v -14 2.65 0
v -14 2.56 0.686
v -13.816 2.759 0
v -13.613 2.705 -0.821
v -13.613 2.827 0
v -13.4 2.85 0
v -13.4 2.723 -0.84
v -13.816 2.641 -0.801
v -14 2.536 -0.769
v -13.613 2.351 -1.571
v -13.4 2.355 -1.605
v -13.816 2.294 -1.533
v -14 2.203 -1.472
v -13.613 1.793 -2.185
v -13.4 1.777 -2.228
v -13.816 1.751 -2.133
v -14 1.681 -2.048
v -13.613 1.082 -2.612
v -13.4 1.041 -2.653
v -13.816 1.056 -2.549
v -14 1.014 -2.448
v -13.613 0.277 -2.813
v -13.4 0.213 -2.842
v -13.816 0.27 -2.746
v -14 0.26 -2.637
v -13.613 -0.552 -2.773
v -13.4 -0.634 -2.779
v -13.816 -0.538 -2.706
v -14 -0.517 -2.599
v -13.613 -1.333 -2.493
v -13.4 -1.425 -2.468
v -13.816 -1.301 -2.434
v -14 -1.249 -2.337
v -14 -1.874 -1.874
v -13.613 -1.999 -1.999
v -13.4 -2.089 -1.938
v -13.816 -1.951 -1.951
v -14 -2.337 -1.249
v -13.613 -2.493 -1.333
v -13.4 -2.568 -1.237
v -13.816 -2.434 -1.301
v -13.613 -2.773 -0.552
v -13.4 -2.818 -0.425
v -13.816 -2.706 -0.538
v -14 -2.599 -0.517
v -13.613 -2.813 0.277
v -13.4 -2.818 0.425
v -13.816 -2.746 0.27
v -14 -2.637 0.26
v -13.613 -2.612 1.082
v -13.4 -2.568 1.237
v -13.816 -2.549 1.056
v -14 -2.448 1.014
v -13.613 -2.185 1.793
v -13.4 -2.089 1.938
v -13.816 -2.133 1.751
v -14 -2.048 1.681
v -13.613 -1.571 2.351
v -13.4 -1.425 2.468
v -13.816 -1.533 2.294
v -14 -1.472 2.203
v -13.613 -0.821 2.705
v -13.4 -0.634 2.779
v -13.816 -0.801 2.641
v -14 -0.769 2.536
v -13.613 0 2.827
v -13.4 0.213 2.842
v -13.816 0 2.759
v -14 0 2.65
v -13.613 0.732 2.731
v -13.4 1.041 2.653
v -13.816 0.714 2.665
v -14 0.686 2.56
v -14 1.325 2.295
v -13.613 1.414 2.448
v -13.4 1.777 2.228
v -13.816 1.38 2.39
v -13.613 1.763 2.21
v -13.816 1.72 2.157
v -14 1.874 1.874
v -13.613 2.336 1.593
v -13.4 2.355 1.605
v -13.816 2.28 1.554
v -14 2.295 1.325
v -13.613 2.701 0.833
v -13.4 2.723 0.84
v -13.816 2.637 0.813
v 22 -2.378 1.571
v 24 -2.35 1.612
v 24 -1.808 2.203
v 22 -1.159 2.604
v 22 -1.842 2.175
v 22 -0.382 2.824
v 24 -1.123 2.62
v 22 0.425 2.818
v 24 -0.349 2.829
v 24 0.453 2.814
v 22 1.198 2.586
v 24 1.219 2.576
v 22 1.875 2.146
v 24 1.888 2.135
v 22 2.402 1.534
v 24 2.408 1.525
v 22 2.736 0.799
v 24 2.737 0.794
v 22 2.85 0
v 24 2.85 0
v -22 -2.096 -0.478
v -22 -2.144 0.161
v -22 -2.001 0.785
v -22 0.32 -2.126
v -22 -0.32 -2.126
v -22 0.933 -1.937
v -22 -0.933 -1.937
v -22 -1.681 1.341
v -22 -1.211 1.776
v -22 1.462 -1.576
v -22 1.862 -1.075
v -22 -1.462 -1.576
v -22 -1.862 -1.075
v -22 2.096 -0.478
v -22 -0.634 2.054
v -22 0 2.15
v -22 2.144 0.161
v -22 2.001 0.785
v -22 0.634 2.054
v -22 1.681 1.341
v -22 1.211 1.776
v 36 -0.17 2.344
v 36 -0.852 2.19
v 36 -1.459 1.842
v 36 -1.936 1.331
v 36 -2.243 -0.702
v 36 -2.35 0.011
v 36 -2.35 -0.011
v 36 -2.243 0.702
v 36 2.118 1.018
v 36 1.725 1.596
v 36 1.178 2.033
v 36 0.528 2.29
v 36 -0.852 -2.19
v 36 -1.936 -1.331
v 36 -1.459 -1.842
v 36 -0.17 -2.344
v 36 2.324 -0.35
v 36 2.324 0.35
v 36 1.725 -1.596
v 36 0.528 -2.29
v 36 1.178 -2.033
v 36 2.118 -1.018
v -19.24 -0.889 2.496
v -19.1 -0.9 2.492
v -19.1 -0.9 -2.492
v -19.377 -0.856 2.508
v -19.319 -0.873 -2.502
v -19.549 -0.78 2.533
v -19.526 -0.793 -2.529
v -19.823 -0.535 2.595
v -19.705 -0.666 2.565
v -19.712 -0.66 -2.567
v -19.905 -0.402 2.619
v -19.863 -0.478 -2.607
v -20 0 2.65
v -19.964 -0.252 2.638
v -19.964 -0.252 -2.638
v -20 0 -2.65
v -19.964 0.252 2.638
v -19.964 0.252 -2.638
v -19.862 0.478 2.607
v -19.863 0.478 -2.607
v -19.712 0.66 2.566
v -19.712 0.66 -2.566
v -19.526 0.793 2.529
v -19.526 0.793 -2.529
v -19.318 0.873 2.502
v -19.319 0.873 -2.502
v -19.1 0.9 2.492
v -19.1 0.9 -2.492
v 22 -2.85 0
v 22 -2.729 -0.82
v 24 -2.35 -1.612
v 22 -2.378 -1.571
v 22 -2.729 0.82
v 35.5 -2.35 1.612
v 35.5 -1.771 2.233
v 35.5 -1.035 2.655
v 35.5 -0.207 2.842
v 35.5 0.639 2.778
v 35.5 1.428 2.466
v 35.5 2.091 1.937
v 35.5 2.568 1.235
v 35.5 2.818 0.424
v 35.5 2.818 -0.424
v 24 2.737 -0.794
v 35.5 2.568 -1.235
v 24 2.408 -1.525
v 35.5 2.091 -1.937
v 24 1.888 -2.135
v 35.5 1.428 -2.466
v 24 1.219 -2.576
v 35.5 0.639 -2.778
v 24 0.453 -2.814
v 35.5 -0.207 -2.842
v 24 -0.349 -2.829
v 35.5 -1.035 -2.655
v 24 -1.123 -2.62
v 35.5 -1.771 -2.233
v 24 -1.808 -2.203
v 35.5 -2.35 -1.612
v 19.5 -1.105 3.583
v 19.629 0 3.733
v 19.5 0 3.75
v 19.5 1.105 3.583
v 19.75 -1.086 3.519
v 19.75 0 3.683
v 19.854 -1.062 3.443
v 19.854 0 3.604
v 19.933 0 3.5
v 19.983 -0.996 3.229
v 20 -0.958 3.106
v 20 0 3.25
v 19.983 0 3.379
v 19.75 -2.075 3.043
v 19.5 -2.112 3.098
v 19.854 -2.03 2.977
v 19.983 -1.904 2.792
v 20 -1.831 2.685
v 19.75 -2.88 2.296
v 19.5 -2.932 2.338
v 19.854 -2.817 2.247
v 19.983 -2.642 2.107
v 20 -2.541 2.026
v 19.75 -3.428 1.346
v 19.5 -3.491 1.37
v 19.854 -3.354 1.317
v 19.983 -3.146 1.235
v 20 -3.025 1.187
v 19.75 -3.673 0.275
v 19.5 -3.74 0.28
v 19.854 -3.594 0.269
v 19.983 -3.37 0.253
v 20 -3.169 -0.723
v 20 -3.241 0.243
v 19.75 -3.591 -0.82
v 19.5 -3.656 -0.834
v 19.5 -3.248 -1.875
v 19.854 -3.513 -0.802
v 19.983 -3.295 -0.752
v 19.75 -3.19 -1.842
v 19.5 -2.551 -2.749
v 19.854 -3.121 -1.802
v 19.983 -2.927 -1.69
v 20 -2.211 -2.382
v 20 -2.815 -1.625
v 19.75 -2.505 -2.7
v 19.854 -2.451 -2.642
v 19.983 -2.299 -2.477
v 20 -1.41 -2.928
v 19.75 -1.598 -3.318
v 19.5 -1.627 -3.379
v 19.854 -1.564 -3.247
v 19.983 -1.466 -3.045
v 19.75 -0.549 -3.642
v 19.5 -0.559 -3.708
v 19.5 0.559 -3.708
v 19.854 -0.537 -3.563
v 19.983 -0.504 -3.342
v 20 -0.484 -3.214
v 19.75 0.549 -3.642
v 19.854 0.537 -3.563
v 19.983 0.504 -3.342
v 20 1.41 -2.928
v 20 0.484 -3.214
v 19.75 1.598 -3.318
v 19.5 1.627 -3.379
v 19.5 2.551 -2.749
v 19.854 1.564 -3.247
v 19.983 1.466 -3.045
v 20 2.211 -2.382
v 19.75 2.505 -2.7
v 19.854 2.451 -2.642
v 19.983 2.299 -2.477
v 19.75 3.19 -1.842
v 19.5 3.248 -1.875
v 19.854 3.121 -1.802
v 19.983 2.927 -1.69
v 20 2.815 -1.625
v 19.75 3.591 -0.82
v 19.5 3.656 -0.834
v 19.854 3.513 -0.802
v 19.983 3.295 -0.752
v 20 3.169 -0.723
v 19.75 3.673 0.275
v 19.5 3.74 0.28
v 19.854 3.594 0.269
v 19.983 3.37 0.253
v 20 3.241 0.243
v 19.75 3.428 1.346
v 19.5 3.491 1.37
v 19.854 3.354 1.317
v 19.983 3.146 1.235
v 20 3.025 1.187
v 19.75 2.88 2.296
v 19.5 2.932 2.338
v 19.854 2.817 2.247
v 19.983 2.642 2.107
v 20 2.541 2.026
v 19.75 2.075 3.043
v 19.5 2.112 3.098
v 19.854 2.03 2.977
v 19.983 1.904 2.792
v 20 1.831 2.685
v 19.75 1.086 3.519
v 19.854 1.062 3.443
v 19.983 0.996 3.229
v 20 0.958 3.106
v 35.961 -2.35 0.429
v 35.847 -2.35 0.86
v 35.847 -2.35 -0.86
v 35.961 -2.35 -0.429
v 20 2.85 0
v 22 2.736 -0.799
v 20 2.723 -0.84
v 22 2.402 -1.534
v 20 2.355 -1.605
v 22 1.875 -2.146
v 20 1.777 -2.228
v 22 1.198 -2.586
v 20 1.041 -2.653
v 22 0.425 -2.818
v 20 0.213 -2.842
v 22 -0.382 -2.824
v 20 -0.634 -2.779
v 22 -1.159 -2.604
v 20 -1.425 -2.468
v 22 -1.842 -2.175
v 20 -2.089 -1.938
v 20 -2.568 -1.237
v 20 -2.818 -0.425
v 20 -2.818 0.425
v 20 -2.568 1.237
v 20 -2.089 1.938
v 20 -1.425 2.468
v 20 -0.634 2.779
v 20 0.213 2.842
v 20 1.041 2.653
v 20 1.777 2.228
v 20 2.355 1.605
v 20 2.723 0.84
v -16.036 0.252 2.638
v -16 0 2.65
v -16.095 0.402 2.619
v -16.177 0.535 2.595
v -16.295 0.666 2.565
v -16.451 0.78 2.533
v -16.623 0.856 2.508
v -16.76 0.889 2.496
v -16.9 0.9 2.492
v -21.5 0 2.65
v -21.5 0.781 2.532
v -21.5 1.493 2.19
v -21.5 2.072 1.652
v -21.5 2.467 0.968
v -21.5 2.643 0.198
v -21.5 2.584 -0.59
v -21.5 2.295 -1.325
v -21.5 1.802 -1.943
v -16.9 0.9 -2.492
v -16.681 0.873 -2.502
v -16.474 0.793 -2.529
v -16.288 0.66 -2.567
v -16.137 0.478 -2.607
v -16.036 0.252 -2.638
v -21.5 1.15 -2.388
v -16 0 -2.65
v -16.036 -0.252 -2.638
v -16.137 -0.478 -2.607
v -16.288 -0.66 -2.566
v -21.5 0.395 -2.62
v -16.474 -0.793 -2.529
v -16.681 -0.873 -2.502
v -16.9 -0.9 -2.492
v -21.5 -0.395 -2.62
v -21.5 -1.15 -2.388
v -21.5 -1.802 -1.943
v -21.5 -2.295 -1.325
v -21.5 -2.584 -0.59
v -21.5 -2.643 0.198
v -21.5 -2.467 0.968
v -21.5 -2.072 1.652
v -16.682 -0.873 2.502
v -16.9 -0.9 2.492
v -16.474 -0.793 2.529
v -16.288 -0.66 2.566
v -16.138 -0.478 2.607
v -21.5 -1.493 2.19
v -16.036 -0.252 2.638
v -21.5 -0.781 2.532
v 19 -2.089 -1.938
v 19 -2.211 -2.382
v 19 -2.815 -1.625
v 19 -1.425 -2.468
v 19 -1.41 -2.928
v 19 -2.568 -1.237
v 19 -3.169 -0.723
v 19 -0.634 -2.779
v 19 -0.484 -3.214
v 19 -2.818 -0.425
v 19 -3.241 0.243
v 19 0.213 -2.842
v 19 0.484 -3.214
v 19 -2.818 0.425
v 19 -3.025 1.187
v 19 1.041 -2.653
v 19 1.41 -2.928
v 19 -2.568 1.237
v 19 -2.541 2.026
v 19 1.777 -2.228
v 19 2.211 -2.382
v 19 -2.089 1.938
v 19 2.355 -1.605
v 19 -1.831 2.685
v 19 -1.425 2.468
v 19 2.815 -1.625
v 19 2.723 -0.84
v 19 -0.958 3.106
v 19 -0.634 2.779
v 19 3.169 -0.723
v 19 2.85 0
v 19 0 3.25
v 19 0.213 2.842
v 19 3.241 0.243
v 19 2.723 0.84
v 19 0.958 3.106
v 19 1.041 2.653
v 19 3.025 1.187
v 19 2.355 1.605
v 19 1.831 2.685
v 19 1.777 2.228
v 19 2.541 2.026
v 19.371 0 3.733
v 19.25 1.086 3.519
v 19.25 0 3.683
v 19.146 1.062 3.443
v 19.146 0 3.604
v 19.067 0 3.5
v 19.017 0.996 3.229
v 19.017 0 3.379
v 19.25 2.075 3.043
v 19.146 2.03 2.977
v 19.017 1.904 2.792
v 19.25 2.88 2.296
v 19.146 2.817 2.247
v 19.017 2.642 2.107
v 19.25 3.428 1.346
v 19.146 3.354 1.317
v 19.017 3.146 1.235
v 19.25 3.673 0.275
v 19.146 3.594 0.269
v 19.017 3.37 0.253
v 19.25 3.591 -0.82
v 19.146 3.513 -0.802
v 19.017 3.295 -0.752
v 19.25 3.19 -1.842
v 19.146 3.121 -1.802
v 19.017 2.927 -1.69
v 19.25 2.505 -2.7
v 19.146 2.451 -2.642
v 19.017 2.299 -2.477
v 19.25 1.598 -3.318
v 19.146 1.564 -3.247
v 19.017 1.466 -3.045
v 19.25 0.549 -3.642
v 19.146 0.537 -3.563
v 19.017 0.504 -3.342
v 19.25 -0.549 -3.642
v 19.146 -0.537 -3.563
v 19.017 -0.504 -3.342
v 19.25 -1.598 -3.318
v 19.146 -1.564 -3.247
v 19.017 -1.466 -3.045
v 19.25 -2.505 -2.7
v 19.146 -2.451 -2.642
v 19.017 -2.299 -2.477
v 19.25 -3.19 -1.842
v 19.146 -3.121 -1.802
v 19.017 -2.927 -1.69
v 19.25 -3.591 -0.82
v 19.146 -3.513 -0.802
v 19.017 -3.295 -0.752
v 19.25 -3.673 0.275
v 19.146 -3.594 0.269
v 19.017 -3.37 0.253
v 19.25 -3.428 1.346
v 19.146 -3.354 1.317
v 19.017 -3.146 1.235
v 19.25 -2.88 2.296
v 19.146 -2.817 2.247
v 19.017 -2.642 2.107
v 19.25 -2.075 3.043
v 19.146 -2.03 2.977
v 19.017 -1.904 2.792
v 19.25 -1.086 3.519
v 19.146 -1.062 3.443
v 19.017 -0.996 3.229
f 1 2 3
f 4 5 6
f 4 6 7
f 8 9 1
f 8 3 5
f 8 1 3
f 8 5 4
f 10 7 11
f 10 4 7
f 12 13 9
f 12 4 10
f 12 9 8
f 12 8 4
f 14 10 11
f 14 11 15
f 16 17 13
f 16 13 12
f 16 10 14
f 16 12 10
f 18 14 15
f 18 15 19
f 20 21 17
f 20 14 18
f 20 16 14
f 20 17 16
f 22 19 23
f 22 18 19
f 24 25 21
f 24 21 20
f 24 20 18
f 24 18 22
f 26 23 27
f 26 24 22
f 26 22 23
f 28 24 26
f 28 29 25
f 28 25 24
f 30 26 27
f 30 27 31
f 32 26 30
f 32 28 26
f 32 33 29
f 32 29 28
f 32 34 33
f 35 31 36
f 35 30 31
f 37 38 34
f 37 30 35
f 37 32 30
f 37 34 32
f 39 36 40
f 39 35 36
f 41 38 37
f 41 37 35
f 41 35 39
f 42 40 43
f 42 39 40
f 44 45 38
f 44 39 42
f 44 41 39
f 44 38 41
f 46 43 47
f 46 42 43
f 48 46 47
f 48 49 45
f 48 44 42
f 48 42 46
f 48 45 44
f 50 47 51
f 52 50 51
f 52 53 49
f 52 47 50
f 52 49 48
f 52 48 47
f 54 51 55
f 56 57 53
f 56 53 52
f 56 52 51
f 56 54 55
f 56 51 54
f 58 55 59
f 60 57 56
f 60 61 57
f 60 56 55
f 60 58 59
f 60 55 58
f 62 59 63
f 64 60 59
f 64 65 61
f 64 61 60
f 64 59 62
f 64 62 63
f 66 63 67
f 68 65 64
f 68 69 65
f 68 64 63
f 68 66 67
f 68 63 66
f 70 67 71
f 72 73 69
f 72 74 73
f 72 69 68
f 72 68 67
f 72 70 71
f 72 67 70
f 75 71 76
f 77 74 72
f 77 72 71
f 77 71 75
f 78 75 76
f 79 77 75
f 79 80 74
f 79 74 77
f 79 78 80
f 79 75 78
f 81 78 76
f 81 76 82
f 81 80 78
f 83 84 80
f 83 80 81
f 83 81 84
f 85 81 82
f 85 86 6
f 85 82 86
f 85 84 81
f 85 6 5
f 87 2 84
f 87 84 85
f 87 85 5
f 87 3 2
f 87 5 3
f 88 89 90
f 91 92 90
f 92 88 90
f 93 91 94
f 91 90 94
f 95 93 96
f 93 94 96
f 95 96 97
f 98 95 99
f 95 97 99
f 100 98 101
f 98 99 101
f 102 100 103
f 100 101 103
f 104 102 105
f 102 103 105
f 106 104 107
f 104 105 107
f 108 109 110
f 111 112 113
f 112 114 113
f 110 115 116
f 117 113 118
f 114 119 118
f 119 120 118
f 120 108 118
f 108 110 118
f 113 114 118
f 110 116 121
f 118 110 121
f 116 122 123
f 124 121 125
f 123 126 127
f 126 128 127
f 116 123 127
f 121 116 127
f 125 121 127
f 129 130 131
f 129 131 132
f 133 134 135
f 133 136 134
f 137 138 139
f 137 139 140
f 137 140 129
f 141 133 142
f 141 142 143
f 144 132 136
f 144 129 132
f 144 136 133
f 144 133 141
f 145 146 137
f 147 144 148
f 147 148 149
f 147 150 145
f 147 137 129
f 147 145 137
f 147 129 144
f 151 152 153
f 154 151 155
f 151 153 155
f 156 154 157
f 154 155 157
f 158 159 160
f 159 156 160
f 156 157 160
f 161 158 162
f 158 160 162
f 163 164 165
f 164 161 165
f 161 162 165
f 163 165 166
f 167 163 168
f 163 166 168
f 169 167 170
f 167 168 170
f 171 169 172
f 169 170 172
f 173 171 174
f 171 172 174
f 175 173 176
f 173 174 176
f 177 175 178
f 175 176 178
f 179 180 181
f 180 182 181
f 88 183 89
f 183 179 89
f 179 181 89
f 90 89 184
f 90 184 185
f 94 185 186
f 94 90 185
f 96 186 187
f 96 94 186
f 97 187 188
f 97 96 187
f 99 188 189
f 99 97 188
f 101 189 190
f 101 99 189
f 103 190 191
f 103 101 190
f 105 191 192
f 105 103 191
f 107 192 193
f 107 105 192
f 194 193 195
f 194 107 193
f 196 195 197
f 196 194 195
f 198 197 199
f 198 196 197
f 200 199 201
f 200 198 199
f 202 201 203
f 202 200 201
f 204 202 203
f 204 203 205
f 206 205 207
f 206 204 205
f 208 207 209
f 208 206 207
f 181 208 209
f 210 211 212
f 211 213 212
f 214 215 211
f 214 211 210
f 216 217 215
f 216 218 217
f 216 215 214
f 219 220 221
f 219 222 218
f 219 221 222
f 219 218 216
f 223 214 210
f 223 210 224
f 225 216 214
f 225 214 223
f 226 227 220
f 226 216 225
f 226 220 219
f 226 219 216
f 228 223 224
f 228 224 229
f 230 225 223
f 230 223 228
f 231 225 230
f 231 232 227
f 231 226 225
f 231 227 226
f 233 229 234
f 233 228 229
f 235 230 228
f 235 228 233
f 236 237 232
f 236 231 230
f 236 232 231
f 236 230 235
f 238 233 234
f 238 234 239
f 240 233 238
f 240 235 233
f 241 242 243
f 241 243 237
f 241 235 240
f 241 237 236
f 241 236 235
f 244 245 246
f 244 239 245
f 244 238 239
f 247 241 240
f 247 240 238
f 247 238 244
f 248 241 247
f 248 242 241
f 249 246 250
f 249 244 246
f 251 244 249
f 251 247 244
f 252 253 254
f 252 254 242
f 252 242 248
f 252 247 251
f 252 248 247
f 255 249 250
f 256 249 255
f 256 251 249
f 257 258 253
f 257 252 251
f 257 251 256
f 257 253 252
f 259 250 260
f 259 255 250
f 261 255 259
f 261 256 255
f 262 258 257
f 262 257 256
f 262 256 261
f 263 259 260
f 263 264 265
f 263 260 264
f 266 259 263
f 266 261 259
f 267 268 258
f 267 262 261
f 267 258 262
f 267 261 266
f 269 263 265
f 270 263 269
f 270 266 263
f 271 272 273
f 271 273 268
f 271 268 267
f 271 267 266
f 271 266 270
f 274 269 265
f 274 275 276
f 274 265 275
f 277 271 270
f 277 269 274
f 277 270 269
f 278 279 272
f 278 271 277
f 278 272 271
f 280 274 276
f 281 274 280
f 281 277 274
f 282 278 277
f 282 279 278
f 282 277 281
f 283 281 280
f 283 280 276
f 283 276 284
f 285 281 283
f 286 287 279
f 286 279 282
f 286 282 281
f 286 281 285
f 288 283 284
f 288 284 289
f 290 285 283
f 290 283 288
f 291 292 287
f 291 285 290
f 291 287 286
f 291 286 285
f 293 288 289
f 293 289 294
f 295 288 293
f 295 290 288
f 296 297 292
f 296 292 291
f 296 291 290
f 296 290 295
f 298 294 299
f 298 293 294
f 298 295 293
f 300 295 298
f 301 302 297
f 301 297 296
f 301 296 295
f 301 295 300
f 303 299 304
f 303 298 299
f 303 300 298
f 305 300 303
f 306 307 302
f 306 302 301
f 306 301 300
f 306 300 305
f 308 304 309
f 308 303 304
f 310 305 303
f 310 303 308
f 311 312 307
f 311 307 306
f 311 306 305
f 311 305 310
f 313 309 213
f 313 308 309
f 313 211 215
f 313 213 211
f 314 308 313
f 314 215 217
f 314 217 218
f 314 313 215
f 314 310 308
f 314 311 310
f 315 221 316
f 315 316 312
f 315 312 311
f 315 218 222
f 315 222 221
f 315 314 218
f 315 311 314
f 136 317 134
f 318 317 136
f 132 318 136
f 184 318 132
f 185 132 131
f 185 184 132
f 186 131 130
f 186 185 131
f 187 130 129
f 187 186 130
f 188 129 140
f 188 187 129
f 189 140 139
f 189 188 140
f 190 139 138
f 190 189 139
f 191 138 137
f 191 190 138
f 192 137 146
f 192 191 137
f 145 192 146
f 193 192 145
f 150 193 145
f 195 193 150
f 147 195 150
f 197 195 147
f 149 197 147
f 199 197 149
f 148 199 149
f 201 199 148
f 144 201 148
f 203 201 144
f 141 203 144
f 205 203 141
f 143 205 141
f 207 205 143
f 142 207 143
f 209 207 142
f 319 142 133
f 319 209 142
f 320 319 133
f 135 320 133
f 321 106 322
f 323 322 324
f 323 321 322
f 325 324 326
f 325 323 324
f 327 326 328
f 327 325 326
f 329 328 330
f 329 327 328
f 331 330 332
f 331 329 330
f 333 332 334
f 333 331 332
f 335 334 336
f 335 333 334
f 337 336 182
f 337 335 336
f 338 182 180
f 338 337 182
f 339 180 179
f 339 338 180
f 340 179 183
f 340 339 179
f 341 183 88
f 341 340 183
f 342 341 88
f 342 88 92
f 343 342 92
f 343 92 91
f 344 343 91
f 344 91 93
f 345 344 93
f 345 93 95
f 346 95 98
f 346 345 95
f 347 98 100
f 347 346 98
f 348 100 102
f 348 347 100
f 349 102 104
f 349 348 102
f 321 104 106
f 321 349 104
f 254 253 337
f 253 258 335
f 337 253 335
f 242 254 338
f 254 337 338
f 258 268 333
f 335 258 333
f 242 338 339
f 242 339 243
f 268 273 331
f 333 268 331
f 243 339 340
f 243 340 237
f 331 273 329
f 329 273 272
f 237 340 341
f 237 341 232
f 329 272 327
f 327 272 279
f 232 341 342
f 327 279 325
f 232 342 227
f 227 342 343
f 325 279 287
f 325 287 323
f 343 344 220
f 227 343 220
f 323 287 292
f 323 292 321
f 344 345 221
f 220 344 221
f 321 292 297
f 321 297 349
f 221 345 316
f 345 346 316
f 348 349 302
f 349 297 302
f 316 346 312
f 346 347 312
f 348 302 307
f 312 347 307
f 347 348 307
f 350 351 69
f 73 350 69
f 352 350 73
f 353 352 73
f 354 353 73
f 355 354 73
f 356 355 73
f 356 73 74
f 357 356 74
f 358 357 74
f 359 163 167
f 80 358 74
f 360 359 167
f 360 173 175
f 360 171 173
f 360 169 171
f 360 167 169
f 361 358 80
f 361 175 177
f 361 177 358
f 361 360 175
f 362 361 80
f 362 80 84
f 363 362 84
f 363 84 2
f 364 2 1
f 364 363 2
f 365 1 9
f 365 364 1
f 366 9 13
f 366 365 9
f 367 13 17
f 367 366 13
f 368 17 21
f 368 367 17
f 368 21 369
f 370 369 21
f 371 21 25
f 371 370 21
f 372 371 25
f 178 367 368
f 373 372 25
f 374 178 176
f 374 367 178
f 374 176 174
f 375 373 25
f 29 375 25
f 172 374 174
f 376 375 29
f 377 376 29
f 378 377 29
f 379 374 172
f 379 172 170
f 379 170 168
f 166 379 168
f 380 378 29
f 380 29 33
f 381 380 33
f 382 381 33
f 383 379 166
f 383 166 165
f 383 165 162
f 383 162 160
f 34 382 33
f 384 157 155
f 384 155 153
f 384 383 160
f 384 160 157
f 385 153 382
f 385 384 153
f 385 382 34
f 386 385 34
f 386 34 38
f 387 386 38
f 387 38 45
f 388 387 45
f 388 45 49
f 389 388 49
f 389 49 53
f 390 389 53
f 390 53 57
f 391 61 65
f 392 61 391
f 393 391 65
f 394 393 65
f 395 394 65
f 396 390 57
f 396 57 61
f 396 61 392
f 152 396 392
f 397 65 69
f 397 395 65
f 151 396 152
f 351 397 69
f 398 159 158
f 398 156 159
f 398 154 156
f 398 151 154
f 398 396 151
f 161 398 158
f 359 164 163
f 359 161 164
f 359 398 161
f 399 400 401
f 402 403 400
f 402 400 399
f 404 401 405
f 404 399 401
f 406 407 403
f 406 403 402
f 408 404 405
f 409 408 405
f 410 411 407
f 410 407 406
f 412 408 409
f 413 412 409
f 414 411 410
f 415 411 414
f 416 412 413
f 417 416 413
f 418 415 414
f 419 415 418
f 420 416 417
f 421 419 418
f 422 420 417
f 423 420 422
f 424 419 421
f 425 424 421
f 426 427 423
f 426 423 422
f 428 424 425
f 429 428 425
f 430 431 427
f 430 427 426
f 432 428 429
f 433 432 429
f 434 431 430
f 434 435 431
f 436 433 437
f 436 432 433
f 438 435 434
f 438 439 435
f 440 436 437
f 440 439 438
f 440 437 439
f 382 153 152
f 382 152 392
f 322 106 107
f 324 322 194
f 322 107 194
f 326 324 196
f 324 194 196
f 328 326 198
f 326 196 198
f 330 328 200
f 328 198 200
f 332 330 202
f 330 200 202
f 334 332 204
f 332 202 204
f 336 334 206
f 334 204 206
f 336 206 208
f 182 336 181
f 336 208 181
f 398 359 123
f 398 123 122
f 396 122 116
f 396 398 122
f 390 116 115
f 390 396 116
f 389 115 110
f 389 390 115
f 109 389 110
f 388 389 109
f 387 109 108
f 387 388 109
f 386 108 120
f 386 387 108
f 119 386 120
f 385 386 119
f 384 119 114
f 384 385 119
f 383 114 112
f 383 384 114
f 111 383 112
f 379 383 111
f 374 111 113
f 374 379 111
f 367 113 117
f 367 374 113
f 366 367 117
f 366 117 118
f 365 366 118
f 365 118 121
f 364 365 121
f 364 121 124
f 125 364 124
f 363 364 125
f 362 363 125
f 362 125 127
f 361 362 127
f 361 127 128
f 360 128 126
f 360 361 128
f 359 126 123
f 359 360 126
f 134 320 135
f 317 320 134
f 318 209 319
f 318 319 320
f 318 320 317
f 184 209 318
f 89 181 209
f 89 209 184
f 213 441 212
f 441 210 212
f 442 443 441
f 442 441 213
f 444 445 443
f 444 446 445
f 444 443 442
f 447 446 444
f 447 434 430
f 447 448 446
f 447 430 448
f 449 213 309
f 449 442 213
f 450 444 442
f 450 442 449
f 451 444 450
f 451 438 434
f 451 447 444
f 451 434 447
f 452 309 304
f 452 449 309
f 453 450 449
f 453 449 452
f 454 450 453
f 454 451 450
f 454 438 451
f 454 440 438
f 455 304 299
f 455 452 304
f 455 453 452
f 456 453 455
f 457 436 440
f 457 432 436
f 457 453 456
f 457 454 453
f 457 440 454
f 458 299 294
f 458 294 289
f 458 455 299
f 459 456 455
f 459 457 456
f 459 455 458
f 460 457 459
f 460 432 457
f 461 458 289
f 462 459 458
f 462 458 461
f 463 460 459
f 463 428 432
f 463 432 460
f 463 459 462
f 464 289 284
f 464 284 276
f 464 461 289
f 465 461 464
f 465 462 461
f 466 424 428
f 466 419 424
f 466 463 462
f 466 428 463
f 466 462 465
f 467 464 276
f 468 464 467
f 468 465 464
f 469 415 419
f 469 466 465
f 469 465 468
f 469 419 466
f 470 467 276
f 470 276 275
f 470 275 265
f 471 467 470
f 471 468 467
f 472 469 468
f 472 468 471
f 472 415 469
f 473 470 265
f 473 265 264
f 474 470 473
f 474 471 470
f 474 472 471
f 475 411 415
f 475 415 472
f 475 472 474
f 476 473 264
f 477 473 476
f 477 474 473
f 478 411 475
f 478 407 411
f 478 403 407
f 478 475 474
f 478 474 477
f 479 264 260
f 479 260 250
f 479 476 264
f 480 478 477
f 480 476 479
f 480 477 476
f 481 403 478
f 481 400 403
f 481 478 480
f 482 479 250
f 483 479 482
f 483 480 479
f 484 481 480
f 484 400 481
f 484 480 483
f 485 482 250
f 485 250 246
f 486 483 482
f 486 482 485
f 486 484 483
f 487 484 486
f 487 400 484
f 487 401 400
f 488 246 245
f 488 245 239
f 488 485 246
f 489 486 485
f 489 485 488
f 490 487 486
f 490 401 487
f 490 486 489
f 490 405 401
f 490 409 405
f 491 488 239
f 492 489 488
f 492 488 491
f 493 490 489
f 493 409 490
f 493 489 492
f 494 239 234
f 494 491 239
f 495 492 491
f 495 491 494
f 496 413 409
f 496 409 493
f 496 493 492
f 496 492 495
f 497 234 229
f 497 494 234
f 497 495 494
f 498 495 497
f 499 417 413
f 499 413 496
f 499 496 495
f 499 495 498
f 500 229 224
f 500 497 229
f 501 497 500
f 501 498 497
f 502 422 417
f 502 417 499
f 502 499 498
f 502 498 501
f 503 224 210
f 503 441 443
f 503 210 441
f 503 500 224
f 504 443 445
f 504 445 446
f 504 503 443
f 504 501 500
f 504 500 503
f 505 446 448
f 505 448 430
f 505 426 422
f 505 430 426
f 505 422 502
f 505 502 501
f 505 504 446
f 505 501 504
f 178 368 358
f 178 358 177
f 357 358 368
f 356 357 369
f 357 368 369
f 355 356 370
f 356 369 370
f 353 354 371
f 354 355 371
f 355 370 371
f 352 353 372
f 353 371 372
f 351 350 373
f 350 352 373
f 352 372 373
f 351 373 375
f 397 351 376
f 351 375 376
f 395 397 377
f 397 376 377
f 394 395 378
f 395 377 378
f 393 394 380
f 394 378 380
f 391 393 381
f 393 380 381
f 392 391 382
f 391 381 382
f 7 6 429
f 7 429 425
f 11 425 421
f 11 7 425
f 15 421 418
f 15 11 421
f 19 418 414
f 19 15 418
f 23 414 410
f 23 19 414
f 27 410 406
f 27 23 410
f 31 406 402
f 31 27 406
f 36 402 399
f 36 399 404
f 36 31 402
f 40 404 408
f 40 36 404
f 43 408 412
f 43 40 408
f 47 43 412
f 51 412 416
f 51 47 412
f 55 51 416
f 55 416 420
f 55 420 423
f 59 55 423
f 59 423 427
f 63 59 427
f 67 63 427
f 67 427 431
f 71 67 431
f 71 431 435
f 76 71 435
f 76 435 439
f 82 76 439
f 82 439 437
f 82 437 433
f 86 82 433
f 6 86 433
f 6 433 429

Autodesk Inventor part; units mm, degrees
ref_plane "YZ Plane" through (0, 0, 0) normal (1, 0, 0) x (0, 1, 0)
sketch "Sketch1" plane through (0, 0, 0) normal (1, 0, 0) x (0, 1, 0)
  circle A0 centre (0, 0) radius 2.85
  dimension "diameter" = 5.7
extrude "Shaft" add sketch "Sketch1" along normal mid plane 44
sketch "Sketch2" plane through (0, 0, 0) normal (0, 0, 1) x (1, 0, 0)
  line L0 (-22, -2.85) -> (-22, 2.85) construction
  line L1 (22, -2.85) -> (-22, -2.85) construction
  line L2 (22, 2.85) -> (22, -2.85) construction
  line L3 (-22, 2.85) -> (22, 2.85) construction
  line L4 (-22, -2.85) -> (22, -2.85) projected
  line L5 (-15, -2.85) -> (-15, -2.85)
  line L6 (-22, -2.85) -> (22, -2.85) projected
  line L7 (-20, 0) -> (-16, 0) construction
  line L8 (-19.1, -0.9) -> (-16.9, -0.9)
  line L9 (-16.9, 0.9) -> (-19.1, 0.9)
  arc A0 (-19.1, 0.9) -> (-19.1, -0.9) centre (-19.1, 0) ccw
  arc A1 (-16.9, -0.9) -> (-16.9, 0.9) centre (-16.9, 0) ccw
  point P0 (0, 0)
  point P1 (22, 0)
  point P2 (-18, 0)
  dimension "d17" = 1.8
  dimension "d20" = 2
  dimension "d21" = 1
  dimension "d22" = 7
extrude "Slot for Differential Gear" cut sketch "Sketch2" along normal through all both and the other way through all
ref_plane "Work Plane1" through (24, 0, 0) normal (1, 0, 0) x (0, 0, -1)
sketch "Sketch3" plane through (24, 0, 0) normal (1, 0, 0) x (0, 0, -1)
  arc A0 (1.6583, -2.5) -> (-1.6583, -2.5) centre (0, 0) ccw construction
  circle A1 centre (0, 0) radius 2.85 construction
  line L0 (-1.6583, -2.5) -> (1.6583, -2.5)
  arc A2 (1.6125, -2.35) -> (-1.6125, -2.35) centre (0, 0) ccw
  line L1 (1.6125, -2.35) -> (-1.6125, -2.35)
  point P0 (-1.3684, -2.5)
  point P1 (1.3684, -2.5)
  dimension "d49" = 3
  dimension "d50" = 2.5
  dimension "wheel_offset" = 0.15
extrude "Wheel Insert Profile" add sketch "Sketch3" along normal blind 12
loft "Loft1" add section 1 edges at (22, -2.85, 0) section 2 edges at (24, -2.35, 0) (24, 2.85, 0)
ref_plane "Work Plane2" through (19, 0, 0) normal (-1, 0, 0) x (0, 0, 1)
sketch "Sketch4" plane through (19, 0, 0) normal (-1, 0, 0) x (0, 0, 1)
  circle A0 centre (0, 0) radius 3.75
  dimension "d35" = 7.5
extrude "Stopper" add sketch "Sketch4" against normal blind 1
fillet "Fillet1" radius 0.5 2 edges at (19, 0, -3.75) (20, 0, -3.75)
sketch "Sketch8" plane through (-22, 0, 0) normal (-1, 0, 0) x (0, 0, 1)
  circle A0 centre (0, 0) radius 2.85 projected
  circle A1 centre (0, 0) radius 2.7 construction
  circle A2 centre (0, 0) radius 2.65
  dimension "d68" = 5.4
  dimension "d69" = 0.05
extrude "Differential Gear Insert Profile" cut sketch "Sketch8" against normal blind 8
fillet "Fillet3" radius 1 1 edges at (-14, -2.85, 0)
chamfer "Chamfer4" distance 0.5 angle 45 2 edges at (-22, 0, -2.65) (36, 2.85, 0)
properties part number "rear shaft v2"
